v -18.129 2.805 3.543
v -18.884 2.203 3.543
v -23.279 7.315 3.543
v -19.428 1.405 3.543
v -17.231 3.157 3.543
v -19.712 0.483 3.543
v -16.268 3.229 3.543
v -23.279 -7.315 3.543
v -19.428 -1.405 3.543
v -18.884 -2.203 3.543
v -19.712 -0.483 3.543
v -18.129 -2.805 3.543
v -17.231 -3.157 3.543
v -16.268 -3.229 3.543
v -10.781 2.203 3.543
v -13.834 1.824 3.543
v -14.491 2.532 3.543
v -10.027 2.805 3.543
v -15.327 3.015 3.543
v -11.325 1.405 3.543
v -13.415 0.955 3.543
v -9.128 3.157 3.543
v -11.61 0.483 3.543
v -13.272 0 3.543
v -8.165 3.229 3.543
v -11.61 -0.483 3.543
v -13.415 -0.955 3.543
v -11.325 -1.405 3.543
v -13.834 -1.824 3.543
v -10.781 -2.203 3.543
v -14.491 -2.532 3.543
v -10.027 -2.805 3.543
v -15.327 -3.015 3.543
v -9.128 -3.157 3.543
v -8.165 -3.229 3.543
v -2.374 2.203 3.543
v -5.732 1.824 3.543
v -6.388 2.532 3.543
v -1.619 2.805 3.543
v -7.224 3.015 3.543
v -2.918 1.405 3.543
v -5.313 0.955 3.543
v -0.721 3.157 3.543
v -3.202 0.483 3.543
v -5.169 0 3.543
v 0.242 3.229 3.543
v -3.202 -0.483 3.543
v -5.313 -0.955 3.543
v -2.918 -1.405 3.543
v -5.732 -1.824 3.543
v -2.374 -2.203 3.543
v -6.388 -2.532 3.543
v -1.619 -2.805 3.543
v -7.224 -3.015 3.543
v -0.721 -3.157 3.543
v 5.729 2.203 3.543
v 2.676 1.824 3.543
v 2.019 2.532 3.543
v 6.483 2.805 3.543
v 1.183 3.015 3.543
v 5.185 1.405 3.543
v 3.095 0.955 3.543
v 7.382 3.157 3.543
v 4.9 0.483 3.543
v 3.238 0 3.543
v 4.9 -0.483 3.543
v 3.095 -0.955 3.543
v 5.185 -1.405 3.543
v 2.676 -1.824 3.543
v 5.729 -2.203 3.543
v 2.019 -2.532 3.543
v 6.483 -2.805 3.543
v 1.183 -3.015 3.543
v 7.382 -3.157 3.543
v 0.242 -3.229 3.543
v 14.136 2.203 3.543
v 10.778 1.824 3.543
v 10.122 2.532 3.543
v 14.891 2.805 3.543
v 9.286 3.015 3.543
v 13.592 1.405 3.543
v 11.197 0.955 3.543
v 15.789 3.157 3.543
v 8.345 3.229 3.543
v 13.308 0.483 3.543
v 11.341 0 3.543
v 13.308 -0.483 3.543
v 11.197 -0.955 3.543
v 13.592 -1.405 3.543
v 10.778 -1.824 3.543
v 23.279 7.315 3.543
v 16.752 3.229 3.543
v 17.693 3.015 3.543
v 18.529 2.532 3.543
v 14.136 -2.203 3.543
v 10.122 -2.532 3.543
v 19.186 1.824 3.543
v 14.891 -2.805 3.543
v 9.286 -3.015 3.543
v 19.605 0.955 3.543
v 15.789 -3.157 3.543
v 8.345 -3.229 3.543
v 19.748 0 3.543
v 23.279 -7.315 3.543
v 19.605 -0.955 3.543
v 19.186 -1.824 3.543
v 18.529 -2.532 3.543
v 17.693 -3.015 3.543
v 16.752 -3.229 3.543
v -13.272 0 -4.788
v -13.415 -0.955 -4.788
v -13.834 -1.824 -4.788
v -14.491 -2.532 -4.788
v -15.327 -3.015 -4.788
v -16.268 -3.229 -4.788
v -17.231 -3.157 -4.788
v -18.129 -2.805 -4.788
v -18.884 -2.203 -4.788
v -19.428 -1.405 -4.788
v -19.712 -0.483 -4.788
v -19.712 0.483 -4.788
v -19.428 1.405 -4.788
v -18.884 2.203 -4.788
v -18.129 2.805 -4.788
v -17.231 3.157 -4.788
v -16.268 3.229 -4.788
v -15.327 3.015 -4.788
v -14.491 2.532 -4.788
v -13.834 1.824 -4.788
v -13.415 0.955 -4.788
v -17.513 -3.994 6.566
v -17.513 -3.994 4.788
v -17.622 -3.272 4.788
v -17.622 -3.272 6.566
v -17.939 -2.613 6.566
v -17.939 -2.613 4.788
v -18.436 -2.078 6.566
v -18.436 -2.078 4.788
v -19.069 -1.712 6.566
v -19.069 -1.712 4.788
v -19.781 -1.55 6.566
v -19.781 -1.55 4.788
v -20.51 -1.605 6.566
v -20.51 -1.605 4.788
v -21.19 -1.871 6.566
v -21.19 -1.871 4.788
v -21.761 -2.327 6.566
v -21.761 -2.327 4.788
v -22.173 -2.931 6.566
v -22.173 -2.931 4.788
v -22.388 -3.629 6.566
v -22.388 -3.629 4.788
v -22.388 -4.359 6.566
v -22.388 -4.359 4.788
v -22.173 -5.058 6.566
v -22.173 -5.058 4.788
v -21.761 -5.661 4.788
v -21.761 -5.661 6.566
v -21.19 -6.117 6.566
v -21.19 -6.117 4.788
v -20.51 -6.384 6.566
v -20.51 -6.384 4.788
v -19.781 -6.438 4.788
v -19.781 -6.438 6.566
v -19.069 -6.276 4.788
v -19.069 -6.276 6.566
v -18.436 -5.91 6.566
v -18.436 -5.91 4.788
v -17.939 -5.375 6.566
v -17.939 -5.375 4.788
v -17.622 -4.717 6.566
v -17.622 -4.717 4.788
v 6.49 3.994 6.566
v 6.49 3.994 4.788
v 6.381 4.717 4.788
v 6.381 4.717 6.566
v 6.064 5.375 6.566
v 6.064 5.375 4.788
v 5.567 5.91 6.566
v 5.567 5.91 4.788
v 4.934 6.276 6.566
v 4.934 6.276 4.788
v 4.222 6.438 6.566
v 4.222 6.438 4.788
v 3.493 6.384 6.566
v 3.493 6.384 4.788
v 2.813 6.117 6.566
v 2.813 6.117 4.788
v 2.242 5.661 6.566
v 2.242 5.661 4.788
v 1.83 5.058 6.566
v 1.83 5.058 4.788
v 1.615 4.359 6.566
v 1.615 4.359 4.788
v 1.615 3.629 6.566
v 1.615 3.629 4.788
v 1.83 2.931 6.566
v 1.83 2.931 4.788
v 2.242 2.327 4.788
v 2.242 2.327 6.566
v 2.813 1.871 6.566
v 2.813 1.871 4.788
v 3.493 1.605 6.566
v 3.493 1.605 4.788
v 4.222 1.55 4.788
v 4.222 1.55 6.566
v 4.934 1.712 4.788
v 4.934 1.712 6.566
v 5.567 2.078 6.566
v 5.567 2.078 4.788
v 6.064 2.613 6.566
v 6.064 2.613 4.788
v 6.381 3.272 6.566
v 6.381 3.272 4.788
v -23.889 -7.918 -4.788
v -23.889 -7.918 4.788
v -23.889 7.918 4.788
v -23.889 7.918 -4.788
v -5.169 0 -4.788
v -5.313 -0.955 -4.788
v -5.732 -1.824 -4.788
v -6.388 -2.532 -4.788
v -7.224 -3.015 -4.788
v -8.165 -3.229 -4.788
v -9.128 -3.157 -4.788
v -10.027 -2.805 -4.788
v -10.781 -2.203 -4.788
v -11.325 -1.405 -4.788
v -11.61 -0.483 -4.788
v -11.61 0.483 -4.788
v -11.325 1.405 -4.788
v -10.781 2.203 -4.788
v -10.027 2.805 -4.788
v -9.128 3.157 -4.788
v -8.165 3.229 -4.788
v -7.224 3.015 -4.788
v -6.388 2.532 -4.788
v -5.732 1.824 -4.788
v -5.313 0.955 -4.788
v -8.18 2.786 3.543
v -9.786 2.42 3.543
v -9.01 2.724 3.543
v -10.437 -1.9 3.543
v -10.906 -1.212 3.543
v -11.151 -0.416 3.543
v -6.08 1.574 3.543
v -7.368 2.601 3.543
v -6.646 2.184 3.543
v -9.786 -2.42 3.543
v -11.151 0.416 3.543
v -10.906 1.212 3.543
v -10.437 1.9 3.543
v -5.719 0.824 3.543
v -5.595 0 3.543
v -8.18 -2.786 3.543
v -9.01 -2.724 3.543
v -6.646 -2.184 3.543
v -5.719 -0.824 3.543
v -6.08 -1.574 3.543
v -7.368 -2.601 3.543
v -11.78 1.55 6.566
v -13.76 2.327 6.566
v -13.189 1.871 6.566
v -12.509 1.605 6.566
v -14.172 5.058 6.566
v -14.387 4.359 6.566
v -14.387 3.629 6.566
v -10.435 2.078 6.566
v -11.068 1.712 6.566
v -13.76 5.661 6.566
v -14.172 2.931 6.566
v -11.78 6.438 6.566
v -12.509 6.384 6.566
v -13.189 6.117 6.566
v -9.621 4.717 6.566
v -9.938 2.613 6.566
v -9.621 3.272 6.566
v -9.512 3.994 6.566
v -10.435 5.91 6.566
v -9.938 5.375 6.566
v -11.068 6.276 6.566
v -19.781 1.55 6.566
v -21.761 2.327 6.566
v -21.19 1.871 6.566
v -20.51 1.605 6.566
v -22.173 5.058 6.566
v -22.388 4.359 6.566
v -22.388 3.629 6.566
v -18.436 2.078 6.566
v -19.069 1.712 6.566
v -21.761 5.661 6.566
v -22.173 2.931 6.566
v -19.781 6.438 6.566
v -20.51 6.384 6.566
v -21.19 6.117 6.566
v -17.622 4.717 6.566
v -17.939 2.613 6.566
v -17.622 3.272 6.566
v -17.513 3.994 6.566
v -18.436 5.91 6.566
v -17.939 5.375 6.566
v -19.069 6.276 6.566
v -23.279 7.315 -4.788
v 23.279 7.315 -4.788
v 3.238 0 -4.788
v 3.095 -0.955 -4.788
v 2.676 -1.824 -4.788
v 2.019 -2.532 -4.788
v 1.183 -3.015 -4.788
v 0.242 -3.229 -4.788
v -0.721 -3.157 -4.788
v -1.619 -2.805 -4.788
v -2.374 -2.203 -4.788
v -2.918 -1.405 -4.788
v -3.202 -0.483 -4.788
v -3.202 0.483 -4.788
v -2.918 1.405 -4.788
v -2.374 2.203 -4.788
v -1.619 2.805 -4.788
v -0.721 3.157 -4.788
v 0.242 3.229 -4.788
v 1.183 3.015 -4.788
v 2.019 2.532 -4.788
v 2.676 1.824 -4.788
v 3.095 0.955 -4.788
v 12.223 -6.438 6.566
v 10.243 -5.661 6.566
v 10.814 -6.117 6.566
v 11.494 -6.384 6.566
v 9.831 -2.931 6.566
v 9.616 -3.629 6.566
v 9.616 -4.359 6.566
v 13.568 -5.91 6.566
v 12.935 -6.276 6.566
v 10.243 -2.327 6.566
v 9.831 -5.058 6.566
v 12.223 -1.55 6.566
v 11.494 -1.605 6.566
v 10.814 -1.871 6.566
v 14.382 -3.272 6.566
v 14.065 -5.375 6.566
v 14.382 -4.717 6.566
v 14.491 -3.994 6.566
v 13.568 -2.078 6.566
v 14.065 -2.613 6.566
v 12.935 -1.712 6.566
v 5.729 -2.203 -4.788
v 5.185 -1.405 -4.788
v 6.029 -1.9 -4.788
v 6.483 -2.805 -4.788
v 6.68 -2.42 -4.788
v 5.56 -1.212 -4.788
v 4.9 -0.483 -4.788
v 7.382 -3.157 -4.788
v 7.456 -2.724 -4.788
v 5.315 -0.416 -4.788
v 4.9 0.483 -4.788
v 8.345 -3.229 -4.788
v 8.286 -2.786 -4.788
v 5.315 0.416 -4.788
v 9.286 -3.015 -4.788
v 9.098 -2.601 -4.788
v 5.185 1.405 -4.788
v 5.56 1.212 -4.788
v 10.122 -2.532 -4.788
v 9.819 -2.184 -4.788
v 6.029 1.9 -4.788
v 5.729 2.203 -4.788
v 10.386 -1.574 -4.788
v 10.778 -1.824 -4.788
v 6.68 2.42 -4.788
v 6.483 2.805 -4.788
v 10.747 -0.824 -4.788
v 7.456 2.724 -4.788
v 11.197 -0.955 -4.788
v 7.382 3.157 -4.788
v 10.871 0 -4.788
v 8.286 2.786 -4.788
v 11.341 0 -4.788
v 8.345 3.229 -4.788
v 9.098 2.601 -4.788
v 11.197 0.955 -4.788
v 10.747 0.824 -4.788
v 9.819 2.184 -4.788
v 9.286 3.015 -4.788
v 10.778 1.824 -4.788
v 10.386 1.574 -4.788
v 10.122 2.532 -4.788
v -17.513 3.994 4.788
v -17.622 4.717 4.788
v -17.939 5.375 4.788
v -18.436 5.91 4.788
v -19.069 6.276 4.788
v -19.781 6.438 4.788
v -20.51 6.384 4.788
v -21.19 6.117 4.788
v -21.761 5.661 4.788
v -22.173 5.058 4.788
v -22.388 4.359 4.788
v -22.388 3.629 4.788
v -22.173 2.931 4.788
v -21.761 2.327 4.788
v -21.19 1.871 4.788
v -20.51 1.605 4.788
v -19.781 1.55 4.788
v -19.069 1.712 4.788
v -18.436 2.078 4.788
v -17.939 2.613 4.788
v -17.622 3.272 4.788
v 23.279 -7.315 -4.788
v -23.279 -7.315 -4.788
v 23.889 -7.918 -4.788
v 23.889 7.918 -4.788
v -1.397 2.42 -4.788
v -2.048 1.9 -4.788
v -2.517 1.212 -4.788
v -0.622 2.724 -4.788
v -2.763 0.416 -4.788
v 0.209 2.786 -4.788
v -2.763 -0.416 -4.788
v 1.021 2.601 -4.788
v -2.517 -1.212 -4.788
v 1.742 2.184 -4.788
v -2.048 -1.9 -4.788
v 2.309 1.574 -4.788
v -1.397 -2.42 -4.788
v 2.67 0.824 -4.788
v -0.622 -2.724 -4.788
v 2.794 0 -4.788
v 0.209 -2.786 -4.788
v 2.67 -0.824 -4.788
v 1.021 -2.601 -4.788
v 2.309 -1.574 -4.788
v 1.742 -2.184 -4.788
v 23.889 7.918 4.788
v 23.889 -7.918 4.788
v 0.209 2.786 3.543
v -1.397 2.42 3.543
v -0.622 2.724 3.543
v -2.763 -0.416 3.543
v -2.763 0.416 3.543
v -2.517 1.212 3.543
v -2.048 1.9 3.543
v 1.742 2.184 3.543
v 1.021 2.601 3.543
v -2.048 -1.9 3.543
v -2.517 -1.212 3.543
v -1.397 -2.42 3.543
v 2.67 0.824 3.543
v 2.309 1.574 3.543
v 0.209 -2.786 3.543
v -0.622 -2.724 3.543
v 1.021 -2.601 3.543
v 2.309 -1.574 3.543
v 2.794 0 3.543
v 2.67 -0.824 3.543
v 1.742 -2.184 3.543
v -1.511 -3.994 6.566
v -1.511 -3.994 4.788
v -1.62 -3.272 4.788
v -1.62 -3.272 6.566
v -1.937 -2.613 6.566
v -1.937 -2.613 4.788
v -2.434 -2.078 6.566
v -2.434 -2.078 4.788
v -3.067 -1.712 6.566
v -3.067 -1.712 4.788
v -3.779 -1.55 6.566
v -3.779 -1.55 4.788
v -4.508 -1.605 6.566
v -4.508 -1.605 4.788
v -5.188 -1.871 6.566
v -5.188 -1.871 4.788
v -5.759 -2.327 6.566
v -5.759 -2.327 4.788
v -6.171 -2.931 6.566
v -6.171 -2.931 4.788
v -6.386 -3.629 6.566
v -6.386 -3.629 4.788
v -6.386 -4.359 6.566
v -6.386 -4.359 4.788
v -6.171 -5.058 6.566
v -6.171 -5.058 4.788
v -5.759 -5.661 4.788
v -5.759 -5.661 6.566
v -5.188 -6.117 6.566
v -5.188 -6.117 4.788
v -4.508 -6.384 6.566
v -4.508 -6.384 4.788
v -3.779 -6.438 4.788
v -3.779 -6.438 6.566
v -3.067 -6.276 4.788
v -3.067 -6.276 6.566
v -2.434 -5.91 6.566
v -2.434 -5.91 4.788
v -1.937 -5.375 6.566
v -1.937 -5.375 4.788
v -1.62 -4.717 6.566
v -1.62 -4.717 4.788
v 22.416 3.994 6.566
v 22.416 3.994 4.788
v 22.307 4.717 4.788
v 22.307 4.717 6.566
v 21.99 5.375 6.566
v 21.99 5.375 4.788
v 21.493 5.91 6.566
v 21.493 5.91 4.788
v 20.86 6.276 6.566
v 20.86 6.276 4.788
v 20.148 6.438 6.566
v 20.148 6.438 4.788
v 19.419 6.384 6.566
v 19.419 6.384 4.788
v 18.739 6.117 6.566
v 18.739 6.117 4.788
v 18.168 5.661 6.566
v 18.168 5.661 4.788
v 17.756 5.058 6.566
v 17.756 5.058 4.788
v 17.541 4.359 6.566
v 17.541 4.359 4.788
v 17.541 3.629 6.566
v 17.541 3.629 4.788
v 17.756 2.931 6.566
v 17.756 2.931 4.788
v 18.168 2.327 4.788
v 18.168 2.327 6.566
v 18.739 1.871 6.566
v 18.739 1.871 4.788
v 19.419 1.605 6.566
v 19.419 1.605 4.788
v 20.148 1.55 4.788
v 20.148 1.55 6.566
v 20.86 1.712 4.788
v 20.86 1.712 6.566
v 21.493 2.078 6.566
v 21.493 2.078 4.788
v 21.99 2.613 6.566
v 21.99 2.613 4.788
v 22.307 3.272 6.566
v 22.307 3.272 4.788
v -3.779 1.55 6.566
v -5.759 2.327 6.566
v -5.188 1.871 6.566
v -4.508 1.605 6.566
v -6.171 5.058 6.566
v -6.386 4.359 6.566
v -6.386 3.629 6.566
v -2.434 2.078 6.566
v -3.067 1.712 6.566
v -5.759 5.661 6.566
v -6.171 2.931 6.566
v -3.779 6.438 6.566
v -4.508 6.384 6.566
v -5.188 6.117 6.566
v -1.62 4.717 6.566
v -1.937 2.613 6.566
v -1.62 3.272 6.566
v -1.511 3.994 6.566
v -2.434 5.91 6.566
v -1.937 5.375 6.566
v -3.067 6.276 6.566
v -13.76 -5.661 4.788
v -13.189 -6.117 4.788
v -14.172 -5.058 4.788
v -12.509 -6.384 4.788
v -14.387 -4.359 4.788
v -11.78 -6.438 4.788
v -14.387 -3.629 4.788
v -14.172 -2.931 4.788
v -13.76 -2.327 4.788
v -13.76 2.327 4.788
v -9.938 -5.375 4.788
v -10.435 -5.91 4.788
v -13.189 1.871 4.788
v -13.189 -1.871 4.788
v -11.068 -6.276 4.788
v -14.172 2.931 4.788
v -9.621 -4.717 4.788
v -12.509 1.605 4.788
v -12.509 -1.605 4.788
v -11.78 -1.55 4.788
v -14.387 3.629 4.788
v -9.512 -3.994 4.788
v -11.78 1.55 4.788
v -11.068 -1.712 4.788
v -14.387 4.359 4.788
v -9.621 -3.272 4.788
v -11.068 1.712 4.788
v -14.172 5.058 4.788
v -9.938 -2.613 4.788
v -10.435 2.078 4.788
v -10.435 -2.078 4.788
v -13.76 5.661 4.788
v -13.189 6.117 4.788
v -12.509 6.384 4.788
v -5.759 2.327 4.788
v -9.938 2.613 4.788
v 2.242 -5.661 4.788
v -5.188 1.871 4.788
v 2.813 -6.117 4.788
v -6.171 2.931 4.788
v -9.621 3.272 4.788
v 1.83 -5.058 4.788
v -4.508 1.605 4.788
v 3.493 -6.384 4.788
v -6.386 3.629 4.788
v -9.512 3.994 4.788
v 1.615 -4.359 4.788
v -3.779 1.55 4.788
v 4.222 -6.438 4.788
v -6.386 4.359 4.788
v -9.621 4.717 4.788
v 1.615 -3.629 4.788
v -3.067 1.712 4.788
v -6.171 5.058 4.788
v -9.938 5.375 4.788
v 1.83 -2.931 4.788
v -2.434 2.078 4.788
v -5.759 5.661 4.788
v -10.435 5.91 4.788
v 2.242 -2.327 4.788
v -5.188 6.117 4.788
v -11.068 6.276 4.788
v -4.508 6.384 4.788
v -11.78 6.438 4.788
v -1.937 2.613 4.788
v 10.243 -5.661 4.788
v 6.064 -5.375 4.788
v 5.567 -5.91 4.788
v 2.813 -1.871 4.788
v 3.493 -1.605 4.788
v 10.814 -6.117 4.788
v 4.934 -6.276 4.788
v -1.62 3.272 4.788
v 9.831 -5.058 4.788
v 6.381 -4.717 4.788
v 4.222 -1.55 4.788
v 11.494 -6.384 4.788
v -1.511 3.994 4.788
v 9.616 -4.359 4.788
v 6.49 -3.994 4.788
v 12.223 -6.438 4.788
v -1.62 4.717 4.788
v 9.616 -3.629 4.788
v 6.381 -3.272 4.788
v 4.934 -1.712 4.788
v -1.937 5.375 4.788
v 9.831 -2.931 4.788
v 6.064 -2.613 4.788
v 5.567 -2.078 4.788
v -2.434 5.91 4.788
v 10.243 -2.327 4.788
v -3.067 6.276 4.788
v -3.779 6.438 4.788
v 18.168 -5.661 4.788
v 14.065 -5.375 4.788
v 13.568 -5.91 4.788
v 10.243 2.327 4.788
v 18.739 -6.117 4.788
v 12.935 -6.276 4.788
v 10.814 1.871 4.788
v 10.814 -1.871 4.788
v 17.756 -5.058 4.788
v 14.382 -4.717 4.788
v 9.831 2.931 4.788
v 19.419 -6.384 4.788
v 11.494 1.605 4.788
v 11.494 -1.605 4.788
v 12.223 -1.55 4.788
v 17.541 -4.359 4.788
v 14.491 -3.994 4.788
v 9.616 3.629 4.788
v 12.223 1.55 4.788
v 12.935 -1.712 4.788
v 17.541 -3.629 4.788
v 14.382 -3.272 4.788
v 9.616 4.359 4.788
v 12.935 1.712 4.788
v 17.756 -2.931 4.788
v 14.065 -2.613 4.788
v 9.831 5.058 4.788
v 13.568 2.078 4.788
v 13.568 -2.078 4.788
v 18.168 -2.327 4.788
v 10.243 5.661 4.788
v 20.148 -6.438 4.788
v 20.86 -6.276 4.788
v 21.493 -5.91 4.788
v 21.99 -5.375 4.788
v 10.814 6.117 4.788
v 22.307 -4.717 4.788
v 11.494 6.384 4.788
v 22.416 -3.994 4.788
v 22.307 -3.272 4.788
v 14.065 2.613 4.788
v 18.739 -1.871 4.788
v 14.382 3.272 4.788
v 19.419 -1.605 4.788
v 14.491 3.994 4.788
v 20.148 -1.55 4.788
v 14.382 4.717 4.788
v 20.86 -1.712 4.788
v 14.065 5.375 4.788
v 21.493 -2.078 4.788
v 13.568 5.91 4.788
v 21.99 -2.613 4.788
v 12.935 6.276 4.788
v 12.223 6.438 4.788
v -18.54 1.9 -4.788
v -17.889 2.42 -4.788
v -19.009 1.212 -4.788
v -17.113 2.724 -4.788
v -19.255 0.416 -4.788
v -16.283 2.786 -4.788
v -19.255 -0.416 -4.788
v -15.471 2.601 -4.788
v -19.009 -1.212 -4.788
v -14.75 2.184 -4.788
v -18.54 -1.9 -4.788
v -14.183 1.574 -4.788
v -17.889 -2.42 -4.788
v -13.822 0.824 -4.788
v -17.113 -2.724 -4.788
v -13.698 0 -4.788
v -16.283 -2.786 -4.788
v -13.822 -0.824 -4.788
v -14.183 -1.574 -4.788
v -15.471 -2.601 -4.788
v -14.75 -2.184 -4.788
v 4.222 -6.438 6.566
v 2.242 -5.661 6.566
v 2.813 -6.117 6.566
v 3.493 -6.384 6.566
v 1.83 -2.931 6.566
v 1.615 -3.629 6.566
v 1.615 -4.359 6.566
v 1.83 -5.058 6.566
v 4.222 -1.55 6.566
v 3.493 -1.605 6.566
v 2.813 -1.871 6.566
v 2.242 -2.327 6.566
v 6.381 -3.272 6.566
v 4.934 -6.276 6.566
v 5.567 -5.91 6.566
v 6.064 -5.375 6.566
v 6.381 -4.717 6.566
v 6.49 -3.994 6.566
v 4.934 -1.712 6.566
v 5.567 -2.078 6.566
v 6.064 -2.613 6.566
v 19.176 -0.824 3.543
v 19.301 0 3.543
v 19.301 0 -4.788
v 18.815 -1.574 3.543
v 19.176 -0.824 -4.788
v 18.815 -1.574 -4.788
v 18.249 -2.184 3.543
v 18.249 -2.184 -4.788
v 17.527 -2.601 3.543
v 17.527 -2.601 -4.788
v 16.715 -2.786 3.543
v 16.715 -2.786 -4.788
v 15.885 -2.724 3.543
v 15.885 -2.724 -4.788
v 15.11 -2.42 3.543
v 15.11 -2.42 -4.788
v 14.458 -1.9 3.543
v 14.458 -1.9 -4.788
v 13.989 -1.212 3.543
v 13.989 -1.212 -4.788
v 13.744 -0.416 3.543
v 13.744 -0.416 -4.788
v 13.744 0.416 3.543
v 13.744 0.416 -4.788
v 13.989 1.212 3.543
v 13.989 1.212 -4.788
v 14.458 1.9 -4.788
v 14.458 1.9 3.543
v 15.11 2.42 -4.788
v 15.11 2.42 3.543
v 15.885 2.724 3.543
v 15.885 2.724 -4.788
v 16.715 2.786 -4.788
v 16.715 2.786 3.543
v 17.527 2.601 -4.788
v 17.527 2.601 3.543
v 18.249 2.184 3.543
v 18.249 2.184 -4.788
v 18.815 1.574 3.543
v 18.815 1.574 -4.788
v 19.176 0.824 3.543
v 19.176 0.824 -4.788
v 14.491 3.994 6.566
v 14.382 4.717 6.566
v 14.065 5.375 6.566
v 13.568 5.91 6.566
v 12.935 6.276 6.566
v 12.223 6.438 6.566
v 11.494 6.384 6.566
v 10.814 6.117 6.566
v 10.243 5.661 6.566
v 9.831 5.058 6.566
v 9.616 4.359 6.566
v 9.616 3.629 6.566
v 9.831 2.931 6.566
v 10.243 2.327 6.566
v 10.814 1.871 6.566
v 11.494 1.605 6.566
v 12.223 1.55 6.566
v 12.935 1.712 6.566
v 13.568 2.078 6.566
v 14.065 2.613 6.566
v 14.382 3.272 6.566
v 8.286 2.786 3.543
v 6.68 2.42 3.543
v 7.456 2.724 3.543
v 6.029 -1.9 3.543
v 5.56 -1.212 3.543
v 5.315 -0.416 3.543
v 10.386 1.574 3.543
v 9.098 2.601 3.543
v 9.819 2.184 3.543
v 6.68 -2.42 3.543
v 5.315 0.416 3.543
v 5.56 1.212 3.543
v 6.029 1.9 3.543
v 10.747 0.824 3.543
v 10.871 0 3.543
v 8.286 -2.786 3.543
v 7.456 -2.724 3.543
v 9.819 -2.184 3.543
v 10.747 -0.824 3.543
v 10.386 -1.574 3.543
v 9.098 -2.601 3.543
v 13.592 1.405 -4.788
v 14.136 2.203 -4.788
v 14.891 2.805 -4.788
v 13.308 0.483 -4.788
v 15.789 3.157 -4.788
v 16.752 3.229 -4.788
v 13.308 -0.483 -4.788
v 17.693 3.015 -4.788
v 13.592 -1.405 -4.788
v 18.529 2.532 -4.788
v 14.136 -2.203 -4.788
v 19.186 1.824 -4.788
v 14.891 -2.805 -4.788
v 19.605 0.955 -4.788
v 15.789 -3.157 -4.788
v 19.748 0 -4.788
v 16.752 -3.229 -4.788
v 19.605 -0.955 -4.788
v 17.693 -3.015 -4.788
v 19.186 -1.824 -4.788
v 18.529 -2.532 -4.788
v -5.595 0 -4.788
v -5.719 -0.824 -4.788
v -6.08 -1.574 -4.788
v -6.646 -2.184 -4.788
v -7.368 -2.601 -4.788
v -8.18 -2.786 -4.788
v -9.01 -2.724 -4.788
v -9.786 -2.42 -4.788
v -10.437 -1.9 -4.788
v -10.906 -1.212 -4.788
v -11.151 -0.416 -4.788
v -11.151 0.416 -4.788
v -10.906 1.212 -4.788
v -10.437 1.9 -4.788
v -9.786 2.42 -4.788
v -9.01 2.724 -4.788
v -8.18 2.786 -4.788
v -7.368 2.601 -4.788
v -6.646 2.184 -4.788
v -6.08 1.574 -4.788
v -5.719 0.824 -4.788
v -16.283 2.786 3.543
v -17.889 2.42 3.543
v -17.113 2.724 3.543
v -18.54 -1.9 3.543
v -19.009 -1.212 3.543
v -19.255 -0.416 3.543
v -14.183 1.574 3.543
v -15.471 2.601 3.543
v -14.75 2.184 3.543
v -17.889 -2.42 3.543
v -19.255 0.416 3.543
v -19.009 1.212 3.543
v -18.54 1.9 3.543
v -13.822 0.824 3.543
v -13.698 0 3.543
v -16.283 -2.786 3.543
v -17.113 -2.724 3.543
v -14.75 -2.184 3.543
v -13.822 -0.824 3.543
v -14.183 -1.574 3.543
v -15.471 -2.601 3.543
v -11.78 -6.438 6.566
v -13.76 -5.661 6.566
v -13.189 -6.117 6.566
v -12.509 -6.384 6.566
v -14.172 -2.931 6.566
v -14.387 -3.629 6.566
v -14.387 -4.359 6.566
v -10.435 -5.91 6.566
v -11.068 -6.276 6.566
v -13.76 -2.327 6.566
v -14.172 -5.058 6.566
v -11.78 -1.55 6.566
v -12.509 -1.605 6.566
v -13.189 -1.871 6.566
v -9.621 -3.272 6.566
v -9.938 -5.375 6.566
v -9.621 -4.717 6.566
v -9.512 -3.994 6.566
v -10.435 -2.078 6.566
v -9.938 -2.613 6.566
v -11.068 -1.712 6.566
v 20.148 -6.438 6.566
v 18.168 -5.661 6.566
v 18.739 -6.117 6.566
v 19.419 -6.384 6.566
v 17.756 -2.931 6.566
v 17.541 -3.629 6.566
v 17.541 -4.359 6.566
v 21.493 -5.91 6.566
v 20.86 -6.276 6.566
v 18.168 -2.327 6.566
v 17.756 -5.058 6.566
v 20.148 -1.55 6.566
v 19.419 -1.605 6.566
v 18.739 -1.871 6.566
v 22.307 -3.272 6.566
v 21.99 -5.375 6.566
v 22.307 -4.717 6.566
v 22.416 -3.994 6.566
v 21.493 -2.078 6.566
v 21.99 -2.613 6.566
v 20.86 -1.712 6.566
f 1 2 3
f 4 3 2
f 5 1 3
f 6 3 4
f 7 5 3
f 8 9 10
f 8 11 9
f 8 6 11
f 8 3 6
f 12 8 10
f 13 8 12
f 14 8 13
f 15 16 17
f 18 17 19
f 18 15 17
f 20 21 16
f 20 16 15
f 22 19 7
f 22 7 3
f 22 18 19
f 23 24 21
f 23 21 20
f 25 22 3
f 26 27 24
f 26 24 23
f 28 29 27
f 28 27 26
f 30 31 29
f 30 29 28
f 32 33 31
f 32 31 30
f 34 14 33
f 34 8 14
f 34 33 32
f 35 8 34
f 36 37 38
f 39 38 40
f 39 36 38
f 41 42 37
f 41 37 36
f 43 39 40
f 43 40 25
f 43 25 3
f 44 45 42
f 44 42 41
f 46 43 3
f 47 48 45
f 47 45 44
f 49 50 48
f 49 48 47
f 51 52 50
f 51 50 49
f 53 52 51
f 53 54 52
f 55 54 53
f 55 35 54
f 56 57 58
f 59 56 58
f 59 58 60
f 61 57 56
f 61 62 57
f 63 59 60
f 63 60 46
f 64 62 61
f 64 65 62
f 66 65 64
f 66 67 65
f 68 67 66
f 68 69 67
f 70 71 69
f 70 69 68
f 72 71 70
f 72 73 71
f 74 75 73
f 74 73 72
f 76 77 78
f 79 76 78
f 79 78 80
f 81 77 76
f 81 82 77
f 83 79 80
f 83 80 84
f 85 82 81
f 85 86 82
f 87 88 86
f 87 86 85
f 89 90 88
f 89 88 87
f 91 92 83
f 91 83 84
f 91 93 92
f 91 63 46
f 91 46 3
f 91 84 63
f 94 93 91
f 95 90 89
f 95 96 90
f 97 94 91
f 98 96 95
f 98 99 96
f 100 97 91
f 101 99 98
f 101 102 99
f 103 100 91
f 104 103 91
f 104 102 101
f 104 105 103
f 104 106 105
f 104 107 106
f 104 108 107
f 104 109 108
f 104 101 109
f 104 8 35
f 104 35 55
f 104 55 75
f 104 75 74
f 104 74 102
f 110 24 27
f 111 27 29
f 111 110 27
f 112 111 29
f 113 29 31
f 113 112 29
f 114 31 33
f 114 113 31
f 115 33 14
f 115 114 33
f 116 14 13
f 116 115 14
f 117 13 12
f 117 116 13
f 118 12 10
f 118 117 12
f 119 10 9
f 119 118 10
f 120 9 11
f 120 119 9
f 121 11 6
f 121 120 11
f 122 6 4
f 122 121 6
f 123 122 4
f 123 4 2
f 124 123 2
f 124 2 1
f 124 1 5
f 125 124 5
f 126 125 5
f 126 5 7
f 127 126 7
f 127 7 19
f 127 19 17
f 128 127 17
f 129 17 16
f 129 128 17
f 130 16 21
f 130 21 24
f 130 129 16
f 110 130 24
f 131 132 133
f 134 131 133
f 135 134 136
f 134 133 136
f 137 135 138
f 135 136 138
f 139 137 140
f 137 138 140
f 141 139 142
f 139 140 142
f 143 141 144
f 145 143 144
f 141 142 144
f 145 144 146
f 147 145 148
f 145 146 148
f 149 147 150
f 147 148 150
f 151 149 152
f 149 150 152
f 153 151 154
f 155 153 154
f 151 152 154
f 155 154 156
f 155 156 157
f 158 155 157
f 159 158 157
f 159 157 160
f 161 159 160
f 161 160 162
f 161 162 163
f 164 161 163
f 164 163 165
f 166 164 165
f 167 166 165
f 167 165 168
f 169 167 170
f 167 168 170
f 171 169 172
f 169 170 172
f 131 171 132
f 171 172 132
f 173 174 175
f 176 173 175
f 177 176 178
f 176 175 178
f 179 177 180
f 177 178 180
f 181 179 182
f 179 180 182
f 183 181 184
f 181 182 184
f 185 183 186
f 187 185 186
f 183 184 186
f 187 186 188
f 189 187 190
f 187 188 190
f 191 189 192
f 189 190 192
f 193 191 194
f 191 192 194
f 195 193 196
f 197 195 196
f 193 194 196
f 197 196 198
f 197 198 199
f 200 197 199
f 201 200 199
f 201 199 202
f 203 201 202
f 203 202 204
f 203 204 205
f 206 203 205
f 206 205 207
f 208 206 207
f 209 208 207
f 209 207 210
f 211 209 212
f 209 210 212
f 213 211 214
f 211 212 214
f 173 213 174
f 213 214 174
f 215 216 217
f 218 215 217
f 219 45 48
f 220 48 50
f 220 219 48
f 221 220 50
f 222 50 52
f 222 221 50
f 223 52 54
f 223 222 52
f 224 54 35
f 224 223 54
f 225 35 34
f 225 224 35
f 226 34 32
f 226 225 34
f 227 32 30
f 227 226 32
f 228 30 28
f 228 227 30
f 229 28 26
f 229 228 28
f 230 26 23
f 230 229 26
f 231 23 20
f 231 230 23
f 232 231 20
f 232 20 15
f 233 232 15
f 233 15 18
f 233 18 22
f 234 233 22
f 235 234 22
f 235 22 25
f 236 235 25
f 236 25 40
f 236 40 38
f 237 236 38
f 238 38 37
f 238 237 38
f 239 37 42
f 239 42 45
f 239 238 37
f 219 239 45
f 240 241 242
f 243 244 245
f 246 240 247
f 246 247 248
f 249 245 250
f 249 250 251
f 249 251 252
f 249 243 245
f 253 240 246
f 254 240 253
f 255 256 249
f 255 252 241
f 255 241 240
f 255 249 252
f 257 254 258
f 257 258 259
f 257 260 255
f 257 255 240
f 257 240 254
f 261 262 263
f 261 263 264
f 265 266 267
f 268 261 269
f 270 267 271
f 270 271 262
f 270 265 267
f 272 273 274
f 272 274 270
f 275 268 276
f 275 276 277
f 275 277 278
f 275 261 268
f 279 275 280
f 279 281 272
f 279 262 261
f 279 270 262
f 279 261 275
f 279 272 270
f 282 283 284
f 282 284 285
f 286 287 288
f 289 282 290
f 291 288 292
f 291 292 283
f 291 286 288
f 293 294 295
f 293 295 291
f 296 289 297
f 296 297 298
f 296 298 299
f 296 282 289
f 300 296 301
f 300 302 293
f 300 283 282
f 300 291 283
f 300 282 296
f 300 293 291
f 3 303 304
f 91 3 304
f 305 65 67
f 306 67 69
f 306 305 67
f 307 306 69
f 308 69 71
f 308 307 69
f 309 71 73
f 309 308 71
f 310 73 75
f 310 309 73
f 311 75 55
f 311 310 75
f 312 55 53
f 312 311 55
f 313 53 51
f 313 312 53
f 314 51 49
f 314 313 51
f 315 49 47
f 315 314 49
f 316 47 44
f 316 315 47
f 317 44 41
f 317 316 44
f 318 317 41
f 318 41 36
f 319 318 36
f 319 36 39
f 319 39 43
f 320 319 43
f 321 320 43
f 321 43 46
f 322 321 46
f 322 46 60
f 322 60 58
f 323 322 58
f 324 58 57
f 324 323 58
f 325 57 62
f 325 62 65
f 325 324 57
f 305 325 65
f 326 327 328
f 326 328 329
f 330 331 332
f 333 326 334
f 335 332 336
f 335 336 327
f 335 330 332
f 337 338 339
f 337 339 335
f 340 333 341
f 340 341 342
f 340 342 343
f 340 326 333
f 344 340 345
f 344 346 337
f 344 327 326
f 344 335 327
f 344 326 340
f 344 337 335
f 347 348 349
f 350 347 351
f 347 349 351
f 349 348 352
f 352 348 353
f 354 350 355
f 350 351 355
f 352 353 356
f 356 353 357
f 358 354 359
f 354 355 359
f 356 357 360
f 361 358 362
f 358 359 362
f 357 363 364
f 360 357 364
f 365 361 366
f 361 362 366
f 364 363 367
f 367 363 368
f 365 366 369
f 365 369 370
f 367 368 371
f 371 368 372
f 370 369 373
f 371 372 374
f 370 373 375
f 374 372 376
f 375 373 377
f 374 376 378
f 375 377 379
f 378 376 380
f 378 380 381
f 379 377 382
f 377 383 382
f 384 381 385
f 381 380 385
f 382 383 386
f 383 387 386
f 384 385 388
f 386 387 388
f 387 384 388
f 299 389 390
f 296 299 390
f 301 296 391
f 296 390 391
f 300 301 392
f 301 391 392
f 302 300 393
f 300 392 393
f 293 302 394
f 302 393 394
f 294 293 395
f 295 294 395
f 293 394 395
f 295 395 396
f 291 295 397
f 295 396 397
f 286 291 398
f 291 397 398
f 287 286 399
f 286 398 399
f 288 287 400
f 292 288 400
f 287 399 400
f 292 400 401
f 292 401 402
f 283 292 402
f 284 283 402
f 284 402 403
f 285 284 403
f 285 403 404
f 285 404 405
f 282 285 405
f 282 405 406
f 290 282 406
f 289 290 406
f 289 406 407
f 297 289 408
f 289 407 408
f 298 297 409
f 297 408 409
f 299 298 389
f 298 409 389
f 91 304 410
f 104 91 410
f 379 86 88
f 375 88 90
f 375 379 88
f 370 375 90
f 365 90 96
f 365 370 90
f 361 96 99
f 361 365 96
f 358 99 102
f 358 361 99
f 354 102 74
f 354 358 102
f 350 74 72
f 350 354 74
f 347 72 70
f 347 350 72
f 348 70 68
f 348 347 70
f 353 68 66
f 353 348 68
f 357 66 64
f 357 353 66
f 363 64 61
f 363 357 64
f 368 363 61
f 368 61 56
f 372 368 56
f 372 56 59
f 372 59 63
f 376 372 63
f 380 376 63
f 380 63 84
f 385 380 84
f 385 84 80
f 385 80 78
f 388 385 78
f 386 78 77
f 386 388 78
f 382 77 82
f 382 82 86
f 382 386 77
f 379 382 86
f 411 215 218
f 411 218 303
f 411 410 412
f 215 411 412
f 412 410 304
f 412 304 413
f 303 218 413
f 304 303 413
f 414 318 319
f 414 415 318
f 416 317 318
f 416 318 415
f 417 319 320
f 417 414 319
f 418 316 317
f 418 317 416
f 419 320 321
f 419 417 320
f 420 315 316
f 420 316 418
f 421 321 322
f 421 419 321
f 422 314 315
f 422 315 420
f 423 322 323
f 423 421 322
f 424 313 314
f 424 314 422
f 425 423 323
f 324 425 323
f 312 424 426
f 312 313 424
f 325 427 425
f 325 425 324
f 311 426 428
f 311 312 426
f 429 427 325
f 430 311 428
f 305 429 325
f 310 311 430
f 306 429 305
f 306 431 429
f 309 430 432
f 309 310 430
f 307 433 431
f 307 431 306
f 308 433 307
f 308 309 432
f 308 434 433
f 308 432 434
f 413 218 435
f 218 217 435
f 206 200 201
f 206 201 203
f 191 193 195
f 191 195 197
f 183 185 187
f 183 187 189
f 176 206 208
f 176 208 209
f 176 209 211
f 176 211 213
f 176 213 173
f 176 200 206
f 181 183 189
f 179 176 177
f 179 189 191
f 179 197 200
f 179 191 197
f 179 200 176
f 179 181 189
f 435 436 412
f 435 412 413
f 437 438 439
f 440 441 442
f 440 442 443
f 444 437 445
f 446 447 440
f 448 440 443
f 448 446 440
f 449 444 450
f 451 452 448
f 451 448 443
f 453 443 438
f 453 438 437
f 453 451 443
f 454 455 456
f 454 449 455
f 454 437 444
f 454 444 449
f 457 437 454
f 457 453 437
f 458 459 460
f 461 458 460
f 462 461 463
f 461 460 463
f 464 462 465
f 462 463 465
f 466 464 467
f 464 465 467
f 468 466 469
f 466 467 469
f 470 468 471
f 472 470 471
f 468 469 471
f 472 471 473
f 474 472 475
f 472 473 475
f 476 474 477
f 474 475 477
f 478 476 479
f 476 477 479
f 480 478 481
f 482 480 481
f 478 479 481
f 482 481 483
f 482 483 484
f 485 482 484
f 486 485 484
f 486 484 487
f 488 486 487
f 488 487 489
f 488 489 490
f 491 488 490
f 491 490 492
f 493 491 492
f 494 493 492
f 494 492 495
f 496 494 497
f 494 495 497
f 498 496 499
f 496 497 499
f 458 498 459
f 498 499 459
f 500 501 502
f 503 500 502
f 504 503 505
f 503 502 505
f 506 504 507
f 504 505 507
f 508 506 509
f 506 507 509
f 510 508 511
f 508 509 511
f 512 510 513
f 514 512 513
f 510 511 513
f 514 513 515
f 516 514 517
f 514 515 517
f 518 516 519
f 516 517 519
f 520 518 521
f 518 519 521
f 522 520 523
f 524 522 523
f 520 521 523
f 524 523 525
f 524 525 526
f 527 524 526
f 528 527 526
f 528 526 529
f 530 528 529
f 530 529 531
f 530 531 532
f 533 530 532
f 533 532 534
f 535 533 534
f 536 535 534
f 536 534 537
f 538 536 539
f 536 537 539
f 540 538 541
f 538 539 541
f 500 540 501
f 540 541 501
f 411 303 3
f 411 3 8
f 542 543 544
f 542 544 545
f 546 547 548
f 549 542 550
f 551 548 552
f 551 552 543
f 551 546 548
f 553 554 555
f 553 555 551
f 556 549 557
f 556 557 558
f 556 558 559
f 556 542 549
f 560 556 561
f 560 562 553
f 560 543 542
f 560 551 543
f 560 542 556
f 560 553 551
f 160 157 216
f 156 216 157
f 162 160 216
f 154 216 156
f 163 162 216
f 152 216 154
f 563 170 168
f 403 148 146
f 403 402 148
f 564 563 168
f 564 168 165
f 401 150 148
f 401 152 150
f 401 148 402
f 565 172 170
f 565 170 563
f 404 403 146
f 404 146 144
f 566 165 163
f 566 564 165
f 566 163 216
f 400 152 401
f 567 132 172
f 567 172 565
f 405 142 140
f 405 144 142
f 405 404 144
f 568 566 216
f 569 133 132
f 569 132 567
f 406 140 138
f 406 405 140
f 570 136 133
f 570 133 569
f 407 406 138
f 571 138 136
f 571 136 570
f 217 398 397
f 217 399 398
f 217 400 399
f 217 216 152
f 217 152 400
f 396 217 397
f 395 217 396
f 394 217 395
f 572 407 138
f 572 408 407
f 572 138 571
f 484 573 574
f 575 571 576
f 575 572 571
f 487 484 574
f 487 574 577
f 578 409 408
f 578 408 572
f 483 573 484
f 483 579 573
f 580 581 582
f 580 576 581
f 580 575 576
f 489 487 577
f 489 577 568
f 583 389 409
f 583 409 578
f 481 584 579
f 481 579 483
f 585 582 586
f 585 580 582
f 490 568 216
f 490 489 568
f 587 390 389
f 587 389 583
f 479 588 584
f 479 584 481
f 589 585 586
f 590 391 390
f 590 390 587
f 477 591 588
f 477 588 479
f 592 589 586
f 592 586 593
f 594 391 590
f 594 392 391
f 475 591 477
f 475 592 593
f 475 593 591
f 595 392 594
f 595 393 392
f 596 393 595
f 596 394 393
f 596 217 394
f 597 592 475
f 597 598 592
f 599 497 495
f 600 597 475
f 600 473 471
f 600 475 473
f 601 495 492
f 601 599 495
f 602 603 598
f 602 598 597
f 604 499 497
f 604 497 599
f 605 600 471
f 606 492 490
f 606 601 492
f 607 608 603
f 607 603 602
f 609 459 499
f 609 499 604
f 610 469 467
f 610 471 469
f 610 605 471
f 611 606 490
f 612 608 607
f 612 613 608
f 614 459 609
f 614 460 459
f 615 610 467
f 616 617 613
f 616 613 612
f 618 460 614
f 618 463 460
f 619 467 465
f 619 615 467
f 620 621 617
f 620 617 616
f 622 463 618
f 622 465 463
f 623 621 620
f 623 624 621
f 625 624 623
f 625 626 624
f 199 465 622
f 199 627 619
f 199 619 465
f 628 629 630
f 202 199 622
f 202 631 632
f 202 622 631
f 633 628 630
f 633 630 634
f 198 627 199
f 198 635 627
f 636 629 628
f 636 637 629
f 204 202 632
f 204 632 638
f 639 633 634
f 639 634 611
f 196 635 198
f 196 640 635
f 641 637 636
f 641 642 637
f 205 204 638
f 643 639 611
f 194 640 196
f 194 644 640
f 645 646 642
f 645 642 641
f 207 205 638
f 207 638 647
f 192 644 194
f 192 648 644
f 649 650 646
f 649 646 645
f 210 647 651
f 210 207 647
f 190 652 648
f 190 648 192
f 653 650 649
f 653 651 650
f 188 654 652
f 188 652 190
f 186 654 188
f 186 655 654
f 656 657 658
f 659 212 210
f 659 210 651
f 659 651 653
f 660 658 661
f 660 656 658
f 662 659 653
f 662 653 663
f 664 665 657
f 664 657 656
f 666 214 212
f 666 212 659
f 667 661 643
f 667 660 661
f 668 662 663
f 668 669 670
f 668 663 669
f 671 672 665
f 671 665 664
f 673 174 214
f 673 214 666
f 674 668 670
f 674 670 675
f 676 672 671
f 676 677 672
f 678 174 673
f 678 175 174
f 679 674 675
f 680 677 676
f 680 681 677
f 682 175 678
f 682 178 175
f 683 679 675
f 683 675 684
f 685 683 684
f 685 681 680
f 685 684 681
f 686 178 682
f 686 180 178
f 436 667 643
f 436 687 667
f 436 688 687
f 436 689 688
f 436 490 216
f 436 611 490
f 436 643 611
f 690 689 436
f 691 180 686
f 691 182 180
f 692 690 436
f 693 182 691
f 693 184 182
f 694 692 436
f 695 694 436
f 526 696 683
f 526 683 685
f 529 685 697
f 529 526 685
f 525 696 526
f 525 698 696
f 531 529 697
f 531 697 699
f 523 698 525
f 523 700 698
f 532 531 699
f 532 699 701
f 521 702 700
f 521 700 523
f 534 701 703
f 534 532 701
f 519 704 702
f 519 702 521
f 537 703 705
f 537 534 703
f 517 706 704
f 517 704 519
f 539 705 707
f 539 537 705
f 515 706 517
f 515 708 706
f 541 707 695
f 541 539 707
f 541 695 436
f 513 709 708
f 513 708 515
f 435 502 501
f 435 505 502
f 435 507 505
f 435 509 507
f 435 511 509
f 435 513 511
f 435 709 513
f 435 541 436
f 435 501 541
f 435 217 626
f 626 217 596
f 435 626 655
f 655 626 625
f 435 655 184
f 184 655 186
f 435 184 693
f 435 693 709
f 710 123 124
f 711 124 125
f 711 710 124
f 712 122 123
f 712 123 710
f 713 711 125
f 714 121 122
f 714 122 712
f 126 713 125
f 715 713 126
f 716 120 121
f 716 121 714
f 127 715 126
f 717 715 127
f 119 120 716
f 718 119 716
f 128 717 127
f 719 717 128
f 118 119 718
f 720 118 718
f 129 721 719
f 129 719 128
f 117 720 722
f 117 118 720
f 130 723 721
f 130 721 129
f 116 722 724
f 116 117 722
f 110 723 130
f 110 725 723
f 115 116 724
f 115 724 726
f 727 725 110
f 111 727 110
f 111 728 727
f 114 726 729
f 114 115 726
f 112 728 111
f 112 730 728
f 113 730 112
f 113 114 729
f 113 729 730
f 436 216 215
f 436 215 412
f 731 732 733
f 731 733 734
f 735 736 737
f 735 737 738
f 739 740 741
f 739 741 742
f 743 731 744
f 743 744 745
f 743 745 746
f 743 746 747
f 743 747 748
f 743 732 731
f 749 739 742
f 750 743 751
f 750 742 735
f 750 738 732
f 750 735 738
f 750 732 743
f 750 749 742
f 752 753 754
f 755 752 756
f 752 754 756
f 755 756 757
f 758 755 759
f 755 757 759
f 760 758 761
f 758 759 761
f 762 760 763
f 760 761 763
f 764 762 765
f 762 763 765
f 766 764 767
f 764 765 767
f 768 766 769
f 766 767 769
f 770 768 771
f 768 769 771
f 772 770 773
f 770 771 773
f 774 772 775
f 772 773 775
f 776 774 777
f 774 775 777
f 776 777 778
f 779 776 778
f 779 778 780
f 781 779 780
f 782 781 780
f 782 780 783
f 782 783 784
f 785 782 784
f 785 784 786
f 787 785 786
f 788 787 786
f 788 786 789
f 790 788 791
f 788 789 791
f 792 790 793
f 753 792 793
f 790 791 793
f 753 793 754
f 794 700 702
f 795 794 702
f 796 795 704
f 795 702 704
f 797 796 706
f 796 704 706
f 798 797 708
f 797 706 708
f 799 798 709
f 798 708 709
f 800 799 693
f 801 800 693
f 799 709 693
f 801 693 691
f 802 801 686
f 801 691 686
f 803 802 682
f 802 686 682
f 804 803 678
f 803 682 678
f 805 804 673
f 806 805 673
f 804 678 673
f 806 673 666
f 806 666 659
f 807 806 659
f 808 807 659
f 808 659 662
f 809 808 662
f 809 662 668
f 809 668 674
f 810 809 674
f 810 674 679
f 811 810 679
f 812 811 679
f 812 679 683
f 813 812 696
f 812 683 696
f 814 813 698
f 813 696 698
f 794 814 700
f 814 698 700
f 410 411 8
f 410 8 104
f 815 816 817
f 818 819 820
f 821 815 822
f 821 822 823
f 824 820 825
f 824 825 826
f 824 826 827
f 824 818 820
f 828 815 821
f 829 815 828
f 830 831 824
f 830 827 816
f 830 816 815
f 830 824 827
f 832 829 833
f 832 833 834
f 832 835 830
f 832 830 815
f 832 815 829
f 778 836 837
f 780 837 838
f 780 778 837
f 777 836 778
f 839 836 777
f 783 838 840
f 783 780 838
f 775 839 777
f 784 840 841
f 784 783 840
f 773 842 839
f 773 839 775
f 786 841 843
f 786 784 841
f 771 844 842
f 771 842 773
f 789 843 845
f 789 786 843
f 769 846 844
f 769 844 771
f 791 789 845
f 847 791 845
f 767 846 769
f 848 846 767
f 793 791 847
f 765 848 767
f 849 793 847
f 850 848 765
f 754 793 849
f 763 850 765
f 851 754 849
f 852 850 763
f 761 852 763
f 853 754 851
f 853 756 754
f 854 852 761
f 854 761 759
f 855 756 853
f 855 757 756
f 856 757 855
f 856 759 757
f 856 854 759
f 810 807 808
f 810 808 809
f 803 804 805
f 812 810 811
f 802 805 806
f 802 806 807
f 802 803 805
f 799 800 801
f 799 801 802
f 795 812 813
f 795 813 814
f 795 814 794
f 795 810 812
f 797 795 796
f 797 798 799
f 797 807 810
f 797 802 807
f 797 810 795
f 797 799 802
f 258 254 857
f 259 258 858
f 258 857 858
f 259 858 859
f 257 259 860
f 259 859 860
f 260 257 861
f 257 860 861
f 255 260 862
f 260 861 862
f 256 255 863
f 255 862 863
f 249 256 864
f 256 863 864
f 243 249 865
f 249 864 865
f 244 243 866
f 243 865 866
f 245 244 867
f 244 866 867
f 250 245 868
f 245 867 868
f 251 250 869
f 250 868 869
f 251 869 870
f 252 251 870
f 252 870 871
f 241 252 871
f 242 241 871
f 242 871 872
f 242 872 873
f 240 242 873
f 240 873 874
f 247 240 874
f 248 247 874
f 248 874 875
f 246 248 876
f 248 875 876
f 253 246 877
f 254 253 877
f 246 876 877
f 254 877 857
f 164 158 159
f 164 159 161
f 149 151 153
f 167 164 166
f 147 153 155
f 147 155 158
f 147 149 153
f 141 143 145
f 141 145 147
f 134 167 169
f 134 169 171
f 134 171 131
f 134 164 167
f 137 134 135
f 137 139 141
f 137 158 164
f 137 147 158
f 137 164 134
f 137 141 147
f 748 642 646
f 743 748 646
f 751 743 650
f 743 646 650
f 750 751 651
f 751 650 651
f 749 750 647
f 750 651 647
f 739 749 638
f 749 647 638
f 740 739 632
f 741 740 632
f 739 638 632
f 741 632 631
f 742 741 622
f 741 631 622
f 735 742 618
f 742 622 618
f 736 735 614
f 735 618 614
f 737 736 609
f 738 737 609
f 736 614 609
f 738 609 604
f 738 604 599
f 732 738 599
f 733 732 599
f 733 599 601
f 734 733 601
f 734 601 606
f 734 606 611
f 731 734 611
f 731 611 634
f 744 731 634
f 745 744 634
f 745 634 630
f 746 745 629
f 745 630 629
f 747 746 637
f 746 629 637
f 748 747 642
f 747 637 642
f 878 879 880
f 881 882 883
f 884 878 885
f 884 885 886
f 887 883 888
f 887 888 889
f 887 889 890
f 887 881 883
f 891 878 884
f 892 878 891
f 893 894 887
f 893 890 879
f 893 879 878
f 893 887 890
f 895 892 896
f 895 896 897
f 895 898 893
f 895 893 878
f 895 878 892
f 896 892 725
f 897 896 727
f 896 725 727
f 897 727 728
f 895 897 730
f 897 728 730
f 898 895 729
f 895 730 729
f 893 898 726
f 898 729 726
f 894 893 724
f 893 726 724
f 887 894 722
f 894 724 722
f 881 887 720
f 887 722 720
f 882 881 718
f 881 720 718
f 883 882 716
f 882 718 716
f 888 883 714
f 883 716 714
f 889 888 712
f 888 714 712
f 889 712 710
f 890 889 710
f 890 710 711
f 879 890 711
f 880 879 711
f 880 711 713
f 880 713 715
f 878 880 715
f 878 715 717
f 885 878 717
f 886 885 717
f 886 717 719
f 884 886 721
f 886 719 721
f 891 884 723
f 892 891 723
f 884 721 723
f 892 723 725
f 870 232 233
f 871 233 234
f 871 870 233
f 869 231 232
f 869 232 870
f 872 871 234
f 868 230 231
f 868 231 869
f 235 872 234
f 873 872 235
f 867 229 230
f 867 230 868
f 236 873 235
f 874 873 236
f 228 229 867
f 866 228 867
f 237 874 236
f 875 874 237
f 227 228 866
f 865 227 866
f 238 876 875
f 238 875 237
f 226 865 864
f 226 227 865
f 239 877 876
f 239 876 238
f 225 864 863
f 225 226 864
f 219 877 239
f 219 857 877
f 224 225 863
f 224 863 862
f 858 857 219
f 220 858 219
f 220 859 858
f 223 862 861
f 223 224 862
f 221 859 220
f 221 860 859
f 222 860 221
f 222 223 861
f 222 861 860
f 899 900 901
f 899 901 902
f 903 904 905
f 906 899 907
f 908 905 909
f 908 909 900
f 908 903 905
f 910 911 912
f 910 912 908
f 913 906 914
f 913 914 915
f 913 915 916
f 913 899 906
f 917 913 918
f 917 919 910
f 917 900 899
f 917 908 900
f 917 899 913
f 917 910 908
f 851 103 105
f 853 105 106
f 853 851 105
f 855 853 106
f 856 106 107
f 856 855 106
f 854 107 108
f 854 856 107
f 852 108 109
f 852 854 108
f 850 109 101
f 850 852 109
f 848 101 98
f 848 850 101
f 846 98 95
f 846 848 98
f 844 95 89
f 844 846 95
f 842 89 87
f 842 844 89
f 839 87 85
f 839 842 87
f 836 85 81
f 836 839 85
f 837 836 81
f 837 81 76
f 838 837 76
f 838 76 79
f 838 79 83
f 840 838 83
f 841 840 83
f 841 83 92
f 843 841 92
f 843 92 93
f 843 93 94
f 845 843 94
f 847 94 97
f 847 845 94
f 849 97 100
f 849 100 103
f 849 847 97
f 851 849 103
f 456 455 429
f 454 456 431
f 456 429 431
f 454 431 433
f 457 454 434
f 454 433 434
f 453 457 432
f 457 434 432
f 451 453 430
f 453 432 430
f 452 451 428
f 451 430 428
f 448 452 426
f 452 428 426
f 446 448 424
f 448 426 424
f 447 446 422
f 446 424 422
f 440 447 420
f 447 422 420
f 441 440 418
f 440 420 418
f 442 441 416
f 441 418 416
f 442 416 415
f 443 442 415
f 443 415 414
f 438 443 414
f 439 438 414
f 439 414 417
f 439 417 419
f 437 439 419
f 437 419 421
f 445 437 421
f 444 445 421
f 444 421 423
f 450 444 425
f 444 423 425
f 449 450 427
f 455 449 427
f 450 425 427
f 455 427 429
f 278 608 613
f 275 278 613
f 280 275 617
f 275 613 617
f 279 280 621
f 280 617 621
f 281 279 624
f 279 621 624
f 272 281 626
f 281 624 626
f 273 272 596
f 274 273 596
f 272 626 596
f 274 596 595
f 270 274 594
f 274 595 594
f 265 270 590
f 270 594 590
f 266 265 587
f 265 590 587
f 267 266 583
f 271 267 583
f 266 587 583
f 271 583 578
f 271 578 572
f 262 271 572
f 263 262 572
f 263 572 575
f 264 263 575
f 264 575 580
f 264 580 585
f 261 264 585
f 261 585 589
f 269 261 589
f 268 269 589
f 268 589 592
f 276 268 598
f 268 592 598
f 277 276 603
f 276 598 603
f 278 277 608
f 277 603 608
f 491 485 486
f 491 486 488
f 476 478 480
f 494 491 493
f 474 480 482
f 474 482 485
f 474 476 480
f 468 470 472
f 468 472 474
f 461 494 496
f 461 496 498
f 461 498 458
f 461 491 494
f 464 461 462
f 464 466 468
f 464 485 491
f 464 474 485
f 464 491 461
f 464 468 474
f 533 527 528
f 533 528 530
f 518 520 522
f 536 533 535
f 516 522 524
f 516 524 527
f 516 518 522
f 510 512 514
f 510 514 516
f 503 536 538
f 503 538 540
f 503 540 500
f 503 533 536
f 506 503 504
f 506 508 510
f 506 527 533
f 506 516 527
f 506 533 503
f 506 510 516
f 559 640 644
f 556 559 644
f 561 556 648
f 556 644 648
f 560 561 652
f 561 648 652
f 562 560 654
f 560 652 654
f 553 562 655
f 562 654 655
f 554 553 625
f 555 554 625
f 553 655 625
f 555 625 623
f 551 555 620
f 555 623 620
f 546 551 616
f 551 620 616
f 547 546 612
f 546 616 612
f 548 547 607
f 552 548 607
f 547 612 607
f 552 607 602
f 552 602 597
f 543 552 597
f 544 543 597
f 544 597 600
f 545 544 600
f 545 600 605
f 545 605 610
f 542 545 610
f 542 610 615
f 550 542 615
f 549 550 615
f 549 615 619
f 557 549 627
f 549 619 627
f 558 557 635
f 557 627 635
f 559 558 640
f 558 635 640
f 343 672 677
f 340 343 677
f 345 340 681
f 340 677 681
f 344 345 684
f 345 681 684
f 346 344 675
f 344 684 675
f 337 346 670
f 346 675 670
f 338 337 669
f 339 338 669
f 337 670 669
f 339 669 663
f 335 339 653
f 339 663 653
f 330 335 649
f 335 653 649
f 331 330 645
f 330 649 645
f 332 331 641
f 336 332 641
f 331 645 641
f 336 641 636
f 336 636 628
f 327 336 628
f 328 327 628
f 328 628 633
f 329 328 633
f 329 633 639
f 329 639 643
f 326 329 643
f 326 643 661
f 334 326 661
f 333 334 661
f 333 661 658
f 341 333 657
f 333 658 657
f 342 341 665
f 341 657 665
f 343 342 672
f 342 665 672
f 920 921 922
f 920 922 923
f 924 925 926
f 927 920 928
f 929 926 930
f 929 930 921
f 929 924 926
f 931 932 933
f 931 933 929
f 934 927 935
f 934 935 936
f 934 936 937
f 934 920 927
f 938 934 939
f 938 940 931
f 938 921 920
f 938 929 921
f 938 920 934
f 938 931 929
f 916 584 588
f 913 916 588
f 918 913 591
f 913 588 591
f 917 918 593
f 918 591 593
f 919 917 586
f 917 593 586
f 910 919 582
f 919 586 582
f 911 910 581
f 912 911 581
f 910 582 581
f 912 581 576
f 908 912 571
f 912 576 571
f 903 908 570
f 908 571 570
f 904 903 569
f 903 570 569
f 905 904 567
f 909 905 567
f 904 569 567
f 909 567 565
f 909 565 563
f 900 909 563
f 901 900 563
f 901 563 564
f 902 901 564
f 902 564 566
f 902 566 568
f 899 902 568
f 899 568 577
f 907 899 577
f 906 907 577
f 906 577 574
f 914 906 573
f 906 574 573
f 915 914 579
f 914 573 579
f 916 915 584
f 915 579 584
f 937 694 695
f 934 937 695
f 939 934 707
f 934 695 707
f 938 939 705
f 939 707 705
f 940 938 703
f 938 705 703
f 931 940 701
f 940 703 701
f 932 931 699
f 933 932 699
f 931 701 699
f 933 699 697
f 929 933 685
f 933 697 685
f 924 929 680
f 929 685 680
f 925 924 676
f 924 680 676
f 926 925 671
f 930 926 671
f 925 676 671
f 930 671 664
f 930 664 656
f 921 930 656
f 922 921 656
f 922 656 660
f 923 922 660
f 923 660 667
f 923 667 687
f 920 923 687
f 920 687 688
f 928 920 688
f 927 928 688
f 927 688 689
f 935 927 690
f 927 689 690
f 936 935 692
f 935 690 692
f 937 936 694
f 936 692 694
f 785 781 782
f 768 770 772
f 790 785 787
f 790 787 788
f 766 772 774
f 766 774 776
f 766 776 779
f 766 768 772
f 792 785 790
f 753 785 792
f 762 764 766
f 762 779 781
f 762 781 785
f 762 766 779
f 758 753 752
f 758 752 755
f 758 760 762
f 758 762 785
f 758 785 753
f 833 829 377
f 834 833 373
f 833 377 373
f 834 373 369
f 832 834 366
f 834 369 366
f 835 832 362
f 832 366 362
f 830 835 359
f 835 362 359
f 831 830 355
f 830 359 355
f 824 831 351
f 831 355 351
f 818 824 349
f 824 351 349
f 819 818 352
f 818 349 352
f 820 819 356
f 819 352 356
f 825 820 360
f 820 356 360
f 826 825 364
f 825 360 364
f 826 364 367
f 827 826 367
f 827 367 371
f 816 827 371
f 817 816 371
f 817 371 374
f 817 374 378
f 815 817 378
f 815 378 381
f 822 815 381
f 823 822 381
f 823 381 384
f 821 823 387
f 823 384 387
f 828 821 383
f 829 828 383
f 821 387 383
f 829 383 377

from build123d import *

# Parameters (mm, degrees)
F0_W      = 47.7774
F0_H      = 15.8369
F1_DEPTH  = 4.7879
F2_R      = 2.4511
F14_DEPTH = 1.778
F3_R      = 2.4511
F15_DEPTH = 1.778
F4_R      = 2.4511
F16_DEPTH = 1.778
F5_R      = 2.4511
F17_DEPTH = 1.778
F6_R      = 2.4511
F18_DEPTH = 1.778
F7_R      = 2.4511
F19_DEPTH = 1.778
F8_R      = 2.4511
F20_DEPTH = 1.778
F9_R      = 2.4511
F21_DEPTH = 1.778
F10_R     = 2.4511
F22_DEPTH = 1.778
F11_R     = 2.4511
F23_DEPTH = 1.778
F12_R     = 2.4511
F24_DEPTH = 1.778
F13_R     = 2.4511
F25_DEPTH = 1.778
F30_W     = 46.5582
F30_H     = 14.6304
F30_R     = 3.2385
F37_DEPTH = 8.3312
F27_R     = 3.2385
F38_DEPTH = 8.3312
F32_R     = 2.794
F39_DEPTH = 8.3312
F28_R     = 3.2385
F40_DEPTH = 8.3312
F29_R     = 3.2385
F41_DEPTH = 8.3312
F31_R     = 3.2385
F42_DEPTH = 8.3312
F33_R     = 2.794
F43_DEPTH = 8.3312
F34_R     = 2.794
F44_DEPTH = 8.3312
F35_R     = 2.794
F45_DEPTH = 8.3312
F36_R     = 2.794
F46_DEPTH = 8.3312


with BuildPart() as f1:
    # F0 (on Top) → F1 (new body, symmetric)
    with BuildSketch(Plane.XY):
        Rectangle(F0_W, F0_H)
    extrude(amount=F1_DEPTH, both=True)

    # F2 (on face) → F14 (join)
    with BuildSketch(Plane.XY.offset(4.7879)):
        with Locations((-19.9644, 3.99415)):
            Circle(F2_R)
    extrude(amount=F14_DEPTH)

    # F3 (on face) → F15 (join)
    with BuildSketch(Plane.XY.offset(4.7879)):
        with Locations((-11.9634, 3.99415)):
            Circle(F3_R)
    extrude(amount=F15_DEPTH)

    # F4 (on face) → F16 (join)
    with BuildSketch(Plane.XY.offset(4.7879)):
        with Locations((-3.9624, 3.99415)):
            Circle(F4_R)
    extrude(amount=F16_DEPTH)

    # F5 (on face) → F17 (join)
    with BuildSketch(Plane.XY.offset(4.7879)):
        with Locations((4.0386, 3.99415)):
            Circle(F5_R)
    extrude(amount=F17_DEPTH)

    # F6 (on face) → F18 (join)
    with BuildSketch(Plane.XY.offset(4.7879)):
        with Locations((12.0396, 3.99415)):
            Circle(F6_R)
    extrude(amount=F18_DEPTH)

    # F7 (on face) → F19 (join)
    with BuildSketch(Plane.XY.offset(4.7879)):
        with Locations((19.9644, 3.99415)):
            Circle(F7_R)
    extrude(amount=F19_DEPTH)

    # F8 (on face) → F20 (join)
    with BuildSketch(Plane.XY.offset(4.7879)):
        with Locations((-19.9644, -3.99415)):
            Circle(F8_R)
    extrude(amount=F20_DEPTH)

    # F9 (on face) → F21 (join)
    with BuildSketch(Plane.XY.offset(4.7879)):
        with Locations((-11.9634, -3.99415)):
            Circle(F9_R)
    extrude(amount=F21_DEPTH)

    # F10 (on face) → F22 (join)
    with BuildSketch(Plane.XY.offset(4.7879)):
        with Locations((-3.9624, -3.99415)):
            Circle(F10_R)
    extrude(amount=F22_DEPTH)

    # F11 (on face) → F23 (join)
    with BuildSketch(Plane.XY.offset(4.7879)):
        with Locations((4.0386, -3.99415)):
            Circle(F11_R)
    extrude(amount=F23_DEPTH)

    # F12 (on face) → F24 (join)
    with BuildSketch(Plane.XY.offset(4.7879)):
        with Locations((12.0396, -3.99415)):
            Circle(F12_R)
    extrude(amount=F24_DEPTH)

    # F13 (on face) → F25 (join)
    with BuildSketch(Plane.XY.offset(4.7879)):
        with Locations((19.9644, -3.99415)):
            Circle(F13_R)
    extrude(amount=F25_DEPTH)

    # F30 (on face) → F37 (cut)
    with BuildSketch(Plane(origin=(0, 0, -4.7879), x_dir=(1, 0, 0), z_dir=(0, 0, -1))):
        Rectangle(F30_W, F30_H)
        with Locations((8.1026, 0)):
            Circle(F30_R, mode=Mode.SUBTRACT)
    extrude(amount=-F37_DEPTH, mode=Mode.SUBTRACT)

    # F27 (on face) → F38 (join)
    with BuildSketch(Plane(origin=(0, 0, -4.7879), x_dir=(1, 0, 0), z_dir=(0, 0, -1))):
        with Locations((-16.51, 0)):
            Circle(F27_R)
    extrude(amount=-F38_DEPTH)

    # F32 (on face) → F39 (cut)
    with BuildSketch(Plane(origin=(0, 0, -4.7879), x_dir=(1, 0, 0), z_dir=(0, 0, -1))):
        with Locations((-16.491707, 0)):
            Circle(F32_R)
    extrude(amount=-F39_DEPTH, mode=Mode.SUBTRACT)

    # F28 (on face) → F40 (join)
    with BuildSketch(Plane(origin=(0, 0, -4.7879), x_dir=(1, 0, 0), z_dir=(0, 0, -1))):
        with Locations((-8.4074, 0)):
            Circle(F28_R)
    extrude(amount=-F40_DEPTH)

    # F29 (on face) → F41 (join)
    with BuildSketch(Plane(origin=(0, 0, -4.7879), x_dir=(1, 0, 0), z_dir=(0, 0, -1))):
        Circle(F29_R)
    extrude(amount=-F41_DEPTH)

    # F31 (on face) → F42 (join)
    with BuildSketch(Plane(origin=(0, 0, -4.7879), x_dir=(1, 0, 0), z_dir=(0, 0, -1))):
        with Locations((16.51, 0)):
            Circle(F31_R)
    extrude(amount=-F42_DEPTH)

    # F33 (on face) → F43 (cut)
    with BuildSketch(Plane(origin=(0, 0, -4.7879), x_dir=(1, 0, 0), z_dir=(0, 0, -1))):
        with Locations((-8.388528, 0)):
            Circle(F33_R)
    extrude(amount=-F43_DEPTH, mode=Mode.SUBTRACT)

    # F34 (on face) → F44 (cut)
    with BuildSketch(Plane(origin=(0, 0, -4.7879), x_dir=(1, 0, 0), z_dir=(0, 0, -1))):
        Circle(F34_R)
    extrude(amount=-F44_DEPTH, mode=Mode.SUBTRACT)

    # F35 (on face) → F45 (cut)
    with BuildSketch(Plane(origin=(0, 0, -4.7879), x_dir=(1, 0, 0), z_dir=(0, 0, -1))):
        with Locations((8.077325, 0)):
            Circle(F35_R)
    extrude(amount=-F45_DEPTH, mode=Mode.SUBTRACT)

    # F36 (on face) → F46 (cut)
    with BuildSketch(Plane(origin=(0, 0, -4.7879), x_dir=(1, 0, 0), z_dir=(0, 0, -1))):
        with Locations((16.506594, 0)):
            Circle(F36_R)
    extrude(amount=-F46_DEPTH, mode=Mode.SUBTRACT)


solid = f1.part
